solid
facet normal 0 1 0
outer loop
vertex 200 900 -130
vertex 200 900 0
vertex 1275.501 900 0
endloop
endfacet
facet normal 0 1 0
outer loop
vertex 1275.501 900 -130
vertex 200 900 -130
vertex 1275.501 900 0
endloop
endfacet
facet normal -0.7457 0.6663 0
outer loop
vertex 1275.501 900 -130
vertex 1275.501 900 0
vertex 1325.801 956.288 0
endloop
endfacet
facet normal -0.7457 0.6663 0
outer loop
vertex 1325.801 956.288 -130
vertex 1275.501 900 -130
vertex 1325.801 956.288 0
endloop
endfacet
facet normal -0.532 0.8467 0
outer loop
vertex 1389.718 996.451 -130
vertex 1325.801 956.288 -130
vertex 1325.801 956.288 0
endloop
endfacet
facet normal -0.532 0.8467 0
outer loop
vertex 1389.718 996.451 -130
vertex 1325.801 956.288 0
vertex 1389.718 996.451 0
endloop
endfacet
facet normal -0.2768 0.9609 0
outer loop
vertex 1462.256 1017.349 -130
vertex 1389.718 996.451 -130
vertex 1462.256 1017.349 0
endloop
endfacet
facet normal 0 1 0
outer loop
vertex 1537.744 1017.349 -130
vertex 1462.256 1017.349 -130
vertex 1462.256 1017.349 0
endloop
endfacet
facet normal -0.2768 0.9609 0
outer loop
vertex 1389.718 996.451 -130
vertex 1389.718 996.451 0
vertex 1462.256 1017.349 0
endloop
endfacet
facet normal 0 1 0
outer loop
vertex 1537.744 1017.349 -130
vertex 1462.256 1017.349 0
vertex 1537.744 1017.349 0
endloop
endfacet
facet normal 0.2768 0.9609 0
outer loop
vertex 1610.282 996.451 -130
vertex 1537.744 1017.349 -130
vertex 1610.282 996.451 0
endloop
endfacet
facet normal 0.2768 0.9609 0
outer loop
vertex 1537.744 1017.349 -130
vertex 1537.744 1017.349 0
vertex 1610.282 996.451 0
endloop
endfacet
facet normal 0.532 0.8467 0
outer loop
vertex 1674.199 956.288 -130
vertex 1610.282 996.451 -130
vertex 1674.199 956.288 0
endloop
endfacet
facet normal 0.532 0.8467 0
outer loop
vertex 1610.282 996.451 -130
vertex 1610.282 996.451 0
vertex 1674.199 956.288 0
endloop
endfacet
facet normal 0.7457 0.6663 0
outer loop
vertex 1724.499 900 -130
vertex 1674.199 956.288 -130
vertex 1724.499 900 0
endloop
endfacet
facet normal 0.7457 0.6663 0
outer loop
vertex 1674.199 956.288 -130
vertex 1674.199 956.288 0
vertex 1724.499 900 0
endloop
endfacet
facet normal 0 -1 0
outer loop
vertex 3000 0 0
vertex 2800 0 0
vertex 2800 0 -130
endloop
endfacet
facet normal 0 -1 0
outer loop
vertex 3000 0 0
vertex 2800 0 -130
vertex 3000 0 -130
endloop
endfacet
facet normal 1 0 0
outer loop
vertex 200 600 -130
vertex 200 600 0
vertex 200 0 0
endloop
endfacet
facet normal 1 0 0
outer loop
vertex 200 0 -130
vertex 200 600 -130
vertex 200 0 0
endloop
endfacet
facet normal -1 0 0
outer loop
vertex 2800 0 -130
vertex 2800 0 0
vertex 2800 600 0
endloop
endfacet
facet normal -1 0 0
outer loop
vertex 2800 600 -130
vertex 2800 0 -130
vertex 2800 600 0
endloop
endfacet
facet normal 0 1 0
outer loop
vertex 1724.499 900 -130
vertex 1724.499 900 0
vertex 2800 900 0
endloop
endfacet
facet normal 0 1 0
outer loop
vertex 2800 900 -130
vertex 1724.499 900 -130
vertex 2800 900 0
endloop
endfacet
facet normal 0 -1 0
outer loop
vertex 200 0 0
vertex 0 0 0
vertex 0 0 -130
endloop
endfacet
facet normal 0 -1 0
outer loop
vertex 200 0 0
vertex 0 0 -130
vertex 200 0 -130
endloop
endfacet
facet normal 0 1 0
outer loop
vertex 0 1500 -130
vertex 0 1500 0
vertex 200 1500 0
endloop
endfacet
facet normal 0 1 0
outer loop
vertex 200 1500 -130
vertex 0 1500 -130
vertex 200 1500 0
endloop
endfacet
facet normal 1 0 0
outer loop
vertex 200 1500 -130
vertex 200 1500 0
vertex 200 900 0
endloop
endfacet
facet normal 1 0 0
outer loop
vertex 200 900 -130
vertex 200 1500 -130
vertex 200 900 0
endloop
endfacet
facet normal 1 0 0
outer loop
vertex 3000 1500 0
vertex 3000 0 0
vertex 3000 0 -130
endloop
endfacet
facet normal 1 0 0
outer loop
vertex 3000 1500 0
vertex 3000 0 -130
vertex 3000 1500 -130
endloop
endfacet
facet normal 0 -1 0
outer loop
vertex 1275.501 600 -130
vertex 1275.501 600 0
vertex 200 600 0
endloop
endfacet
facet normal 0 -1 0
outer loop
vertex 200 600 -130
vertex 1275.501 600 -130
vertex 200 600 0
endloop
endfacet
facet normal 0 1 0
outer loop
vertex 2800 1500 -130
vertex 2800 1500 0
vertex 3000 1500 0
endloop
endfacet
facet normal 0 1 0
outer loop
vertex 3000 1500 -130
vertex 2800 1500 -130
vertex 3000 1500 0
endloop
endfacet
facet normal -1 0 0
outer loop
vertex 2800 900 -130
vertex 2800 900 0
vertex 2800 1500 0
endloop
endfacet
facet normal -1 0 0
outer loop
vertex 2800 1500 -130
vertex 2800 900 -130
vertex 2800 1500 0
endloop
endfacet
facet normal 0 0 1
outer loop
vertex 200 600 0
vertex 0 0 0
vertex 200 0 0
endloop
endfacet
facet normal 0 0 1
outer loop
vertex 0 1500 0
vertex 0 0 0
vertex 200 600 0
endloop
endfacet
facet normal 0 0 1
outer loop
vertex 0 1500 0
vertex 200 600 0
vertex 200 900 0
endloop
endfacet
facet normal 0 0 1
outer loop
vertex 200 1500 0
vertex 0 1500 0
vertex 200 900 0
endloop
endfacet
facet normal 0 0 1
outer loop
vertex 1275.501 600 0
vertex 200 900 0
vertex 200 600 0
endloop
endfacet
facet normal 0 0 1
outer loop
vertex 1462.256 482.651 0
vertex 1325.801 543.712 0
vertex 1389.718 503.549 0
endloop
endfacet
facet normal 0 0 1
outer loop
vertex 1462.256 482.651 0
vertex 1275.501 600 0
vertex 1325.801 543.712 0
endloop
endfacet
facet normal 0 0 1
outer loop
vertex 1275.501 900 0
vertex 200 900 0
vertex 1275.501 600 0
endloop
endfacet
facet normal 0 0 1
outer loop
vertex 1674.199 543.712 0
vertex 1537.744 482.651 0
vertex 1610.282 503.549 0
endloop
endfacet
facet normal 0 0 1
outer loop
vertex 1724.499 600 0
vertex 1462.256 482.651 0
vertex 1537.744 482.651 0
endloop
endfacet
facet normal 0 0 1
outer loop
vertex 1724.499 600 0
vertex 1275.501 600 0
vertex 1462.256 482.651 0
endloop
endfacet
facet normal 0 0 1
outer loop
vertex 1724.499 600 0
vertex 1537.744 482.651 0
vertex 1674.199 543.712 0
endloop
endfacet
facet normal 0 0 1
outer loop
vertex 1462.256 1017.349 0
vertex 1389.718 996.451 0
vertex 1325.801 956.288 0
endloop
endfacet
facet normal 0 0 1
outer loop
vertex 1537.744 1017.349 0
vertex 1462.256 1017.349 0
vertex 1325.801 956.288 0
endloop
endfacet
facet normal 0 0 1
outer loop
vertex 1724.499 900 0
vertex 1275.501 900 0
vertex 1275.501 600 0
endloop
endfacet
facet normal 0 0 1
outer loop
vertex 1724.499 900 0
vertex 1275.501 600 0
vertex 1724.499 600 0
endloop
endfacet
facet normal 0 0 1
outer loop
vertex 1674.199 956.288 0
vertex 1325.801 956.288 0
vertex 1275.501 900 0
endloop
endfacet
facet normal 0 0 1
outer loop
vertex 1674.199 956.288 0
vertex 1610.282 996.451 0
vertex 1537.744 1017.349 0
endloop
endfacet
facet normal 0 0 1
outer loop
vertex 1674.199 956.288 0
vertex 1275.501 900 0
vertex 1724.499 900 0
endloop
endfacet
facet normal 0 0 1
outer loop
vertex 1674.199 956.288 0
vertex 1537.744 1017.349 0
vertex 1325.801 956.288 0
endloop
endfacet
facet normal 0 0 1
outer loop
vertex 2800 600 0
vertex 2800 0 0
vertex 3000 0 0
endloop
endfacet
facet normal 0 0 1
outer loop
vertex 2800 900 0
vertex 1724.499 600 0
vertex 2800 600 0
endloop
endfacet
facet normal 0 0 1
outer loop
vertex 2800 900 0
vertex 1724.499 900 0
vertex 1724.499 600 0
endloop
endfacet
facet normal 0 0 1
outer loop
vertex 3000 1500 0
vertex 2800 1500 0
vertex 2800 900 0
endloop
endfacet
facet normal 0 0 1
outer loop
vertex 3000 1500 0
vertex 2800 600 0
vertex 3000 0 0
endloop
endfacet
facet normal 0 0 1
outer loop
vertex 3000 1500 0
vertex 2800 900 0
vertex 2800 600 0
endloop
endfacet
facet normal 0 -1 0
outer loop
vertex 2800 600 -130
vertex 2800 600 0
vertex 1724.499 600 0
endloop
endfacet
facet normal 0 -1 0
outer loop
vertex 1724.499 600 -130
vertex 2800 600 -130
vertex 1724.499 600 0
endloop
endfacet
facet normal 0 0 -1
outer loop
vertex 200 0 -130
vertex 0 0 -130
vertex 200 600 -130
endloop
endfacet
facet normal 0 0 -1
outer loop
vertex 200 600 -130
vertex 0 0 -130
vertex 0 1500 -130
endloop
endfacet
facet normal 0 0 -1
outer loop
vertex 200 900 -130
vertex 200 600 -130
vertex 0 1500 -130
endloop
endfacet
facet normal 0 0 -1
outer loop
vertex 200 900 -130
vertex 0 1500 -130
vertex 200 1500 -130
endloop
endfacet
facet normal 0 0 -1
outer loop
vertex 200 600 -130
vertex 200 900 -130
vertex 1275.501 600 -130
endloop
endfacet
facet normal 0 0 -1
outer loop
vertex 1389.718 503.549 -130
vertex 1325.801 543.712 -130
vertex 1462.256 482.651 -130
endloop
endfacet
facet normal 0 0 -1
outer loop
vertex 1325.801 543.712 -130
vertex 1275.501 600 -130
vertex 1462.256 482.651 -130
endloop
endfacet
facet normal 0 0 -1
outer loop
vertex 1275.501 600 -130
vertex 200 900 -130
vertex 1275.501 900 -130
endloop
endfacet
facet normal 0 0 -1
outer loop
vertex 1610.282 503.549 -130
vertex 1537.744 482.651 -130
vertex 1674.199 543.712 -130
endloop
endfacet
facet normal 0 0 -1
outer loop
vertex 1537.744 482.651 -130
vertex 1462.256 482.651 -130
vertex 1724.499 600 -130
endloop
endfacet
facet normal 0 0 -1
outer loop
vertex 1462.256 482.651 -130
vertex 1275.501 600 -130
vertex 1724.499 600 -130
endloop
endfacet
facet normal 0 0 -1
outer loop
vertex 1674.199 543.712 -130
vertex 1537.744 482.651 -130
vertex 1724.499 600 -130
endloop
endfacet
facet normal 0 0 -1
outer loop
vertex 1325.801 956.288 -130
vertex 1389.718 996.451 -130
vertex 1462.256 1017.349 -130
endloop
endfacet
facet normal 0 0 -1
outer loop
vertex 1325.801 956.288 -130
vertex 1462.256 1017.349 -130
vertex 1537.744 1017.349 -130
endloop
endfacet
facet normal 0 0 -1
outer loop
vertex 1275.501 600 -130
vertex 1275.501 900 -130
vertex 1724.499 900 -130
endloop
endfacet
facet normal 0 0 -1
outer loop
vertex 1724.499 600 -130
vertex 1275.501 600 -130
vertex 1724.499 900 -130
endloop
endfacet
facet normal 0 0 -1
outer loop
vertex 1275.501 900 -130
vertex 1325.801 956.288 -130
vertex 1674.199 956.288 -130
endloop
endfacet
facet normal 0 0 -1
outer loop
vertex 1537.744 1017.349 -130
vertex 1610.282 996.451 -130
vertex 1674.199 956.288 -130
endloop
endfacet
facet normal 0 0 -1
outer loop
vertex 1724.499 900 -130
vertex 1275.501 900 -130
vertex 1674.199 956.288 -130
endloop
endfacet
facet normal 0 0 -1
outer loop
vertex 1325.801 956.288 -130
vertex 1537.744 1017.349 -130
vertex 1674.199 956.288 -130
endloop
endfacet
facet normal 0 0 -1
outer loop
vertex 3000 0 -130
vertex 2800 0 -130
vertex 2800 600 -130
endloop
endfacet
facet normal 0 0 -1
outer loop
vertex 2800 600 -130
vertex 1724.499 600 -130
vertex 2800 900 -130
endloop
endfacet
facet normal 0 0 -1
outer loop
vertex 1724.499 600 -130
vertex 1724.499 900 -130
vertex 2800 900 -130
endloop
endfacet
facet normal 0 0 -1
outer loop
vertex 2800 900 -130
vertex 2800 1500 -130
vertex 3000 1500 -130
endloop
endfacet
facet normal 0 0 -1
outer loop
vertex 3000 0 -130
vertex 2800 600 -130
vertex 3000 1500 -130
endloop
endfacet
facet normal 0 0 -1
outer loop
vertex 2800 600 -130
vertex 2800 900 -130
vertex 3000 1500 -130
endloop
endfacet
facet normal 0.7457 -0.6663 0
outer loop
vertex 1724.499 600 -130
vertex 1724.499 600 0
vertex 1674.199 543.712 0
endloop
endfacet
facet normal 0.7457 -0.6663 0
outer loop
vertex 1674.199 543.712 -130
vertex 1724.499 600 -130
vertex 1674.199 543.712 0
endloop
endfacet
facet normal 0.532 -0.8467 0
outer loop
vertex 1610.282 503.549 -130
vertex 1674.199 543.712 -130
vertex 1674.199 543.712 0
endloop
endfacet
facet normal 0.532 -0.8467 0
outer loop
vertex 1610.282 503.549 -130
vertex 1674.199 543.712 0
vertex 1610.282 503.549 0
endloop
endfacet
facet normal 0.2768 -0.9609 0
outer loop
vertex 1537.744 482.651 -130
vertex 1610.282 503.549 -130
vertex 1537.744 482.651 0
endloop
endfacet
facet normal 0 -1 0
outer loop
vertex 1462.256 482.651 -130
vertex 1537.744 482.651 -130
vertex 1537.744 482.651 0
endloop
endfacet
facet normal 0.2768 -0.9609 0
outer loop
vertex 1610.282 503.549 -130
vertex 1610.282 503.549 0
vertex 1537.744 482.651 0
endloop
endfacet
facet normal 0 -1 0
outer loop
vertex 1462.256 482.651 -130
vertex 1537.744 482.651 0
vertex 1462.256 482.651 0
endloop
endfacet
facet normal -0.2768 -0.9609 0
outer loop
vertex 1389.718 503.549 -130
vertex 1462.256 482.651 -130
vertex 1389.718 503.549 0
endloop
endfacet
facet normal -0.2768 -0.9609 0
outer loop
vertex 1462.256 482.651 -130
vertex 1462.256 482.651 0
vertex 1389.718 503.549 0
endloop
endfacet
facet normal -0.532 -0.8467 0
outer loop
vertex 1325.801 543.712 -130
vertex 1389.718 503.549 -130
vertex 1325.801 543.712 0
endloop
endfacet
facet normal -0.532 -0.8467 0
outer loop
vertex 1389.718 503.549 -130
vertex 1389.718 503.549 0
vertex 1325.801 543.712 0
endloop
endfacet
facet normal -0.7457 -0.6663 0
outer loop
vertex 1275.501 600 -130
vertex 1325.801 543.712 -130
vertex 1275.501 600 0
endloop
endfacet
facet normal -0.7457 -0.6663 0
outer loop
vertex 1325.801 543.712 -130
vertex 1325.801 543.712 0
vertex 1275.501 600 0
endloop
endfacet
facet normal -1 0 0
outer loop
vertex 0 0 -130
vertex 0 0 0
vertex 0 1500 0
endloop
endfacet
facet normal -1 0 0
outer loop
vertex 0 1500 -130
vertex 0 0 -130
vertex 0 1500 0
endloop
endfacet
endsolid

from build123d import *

# Parameters (mm, degrees)
ESQUISSE1_W             = 3000
ESQUISSE1_H             = 1500
BOSS_EXTRU_1_DEPTH      = 130
ENL_V_MAT_EXTRU_1_DEPTH = 130


with BuildPart() as part:
    # Esquisse1 → Boss.-Extru.1 (new body)
    with BuildSketch(Plane.XY):
        with Locations((1500, 750)):
            Rectangle(ESQUISSE1_W, ESQUISSE1_H)
    extrude(amount=-BOSS_EXTRU_1_DEPTH)

    # Esquisse4 → Enlèv. mat.-Extru.1 (cut)
    with BuildSketch(Plane.XY):
        with BuildLine():
            Line((200, 900), (1275.500556794, 900))
            ThreePointArc((1275.500556794, 900), (1500, 1020), (1724.499443206, 900))
            Line((1724.499443206, 900), (2800, 900))
            Line((2800, 900), (2800, 1500))
            Line((2800, 1500), (200, 1500))
            Line((200, 1500), (200, 900))
        make_face()
        with BuildLine():
            Line((200, 600), (200, 0))
            Line((200, 0), (2800, 0))
            Line((2800, 0), (2800, 600))
            Line((2800, 600), (1724.499443206, 600))
            ThreePointArc((1724.499443206, 600), (1500, 480), (1275.500556794, 600))
            Line((1275.500556794, 600), (200, 600))
        make_face()
    extrude(amount=-ENL_V_MAT_EXTRU_1_DEPTH, mode=Mode.SUBTRACT)


solid = part.part
